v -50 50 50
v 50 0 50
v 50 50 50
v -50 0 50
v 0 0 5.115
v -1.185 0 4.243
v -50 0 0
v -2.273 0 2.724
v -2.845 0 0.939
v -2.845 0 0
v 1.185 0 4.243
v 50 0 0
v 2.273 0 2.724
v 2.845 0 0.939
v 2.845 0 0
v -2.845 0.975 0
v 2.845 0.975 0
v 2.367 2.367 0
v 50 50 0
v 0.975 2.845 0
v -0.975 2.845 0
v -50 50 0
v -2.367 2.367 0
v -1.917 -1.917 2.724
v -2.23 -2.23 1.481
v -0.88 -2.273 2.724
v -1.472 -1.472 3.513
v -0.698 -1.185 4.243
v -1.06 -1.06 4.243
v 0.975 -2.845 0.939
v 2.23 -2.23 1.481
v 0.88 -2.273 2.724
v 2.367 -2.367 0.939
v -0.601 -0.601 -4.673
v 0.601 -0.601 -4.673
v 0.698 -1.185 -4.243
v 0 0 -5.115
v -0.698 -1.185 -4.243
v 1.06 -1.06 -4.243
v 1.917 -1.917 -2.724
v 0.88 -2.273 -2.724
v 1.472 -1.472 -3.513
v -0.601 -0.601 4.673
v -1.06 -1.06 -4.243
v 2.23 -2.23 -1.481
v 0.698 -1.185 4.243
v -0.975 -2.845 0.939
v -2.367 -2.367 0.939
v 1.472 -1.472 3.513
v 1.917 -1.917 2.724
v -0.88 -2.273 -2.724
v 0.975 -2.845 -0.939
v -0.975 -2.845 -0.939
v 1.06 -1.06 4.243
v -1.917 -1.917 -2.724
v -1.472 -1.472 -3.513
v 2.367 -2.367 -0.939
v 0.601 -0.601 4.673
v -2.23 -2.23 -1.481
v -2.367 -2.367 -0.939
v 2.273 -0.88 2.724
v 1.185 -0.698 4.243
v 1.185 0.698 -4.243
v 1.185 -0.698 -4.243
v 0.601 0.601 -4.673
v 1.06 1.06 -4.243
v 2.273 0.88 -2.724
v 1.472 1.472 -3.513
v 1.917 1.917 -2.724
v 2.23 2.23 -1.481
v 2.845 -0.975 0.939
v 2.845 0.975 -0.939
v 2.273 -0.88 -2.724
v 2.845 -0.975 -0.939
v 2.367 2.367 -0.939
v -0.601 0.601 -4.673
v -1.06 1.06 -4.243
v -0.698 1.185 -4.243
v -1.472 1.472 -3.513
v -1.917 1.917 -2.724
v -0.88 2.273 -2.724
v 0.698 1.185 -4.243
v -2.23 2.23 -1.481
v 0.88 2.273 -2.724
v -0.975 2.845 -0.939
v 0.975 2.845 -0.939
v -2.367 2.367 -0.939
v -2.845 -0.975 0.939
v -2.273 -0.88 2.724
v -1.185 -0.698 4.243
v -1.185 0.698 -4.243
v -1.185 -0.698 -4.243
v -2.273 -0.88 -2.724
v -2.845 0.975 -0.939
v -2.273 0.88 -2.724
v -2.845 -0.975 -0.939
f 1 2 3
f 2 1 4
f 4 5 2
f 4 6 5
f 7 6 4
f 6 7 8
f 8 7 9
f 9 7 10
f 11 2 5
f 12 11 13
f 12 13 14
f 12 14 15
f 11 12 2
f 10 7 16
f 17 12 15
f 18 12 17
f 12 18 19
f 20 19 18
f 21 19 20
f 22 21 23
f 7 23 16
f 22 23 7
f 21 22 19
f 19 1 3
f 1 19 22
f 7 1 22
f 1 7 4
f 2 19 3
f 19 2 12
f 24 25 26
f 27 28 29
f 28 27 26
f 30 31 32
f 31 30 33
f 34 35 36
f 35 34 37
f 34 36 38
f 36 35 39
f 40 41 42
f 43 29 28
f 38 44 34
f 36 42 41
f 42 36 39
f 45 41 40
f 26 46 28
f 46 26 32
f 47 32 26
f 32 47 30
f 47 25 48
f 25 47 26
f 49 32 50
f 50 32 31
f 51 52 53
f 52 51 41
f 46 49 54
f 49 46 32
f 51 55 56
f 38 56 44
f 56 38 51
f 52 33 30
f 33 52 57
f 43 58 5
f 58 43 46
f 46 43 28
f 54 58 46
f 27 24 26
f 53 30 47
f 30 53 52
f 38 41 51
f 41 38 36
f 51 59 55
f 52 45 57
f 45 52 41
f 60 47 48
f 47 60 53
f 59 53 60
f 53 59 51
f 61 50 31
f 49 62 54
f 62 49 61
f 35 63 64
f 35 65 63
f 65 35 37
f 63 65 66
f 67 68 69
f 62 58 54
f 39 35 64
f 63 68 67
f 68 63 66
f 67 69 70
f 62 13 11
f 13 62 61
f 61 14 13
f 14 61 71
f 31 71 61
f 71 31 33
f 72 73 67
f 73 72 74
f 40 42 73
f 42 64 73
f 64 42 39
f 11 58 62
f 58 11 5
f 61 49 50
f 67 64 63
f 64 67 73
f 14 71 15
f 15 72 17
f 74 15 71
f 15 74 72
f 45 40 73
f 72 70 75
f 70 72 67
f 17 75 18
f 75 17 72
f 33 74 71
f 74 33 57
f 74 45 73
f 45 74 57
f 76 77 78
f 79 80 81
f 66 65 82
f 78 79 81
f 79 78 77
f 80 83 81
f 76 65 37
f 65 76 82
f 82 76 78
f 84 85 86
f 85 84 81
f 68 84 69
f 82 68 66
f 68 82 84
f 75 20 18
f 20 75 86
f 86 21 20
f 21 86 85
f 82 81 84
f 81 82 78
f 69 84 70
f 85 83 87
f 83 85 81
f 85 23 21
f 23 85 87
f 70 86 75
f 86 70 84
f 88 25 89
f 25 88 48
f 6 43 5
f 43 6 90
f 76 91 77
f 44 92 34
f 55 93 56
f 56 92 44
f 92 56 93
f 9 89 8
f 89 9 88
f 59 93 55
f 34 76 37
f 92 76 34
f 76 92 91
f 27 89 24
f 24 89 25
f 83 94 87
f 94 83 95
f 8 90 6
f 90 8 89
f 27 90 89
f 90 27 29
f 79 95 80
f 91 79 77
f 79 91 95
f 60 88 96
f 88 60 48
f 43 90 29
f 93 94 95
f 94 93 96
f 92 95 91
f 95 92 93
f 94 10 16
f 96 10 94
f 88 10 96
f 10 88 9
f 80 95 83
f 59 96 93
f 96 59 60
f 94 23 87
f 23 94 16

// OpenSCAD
//= Objekty s % jsou pouze v nahledu
//= Objekty s # pouzivaji normalne
//= Pri definic promenne na vice mistech plati jeji posledni definice


//= Vykresli kvadr 25x10x5 vycentrovanou na vsech osach
// cube([25,10,5], center=true);

//= Koule o polomeru vycentrovana na vsech osach
// sphere(5);

//= Vykresluje kuzel (spodni polomer, vrchni polomer, vyska)
// cylinder( r1=13, r2=0, h=20 );

//= Kostka o hrane 150, vycentrovana
// cube( 150, center=true);

//= Posunuje kouli po ose x o 200 jednotek
// translate( [-200, 0, 0] )
    // sphere( 100 );

//= Zrcadleni podle osy y
// mirror([0,1,0])
    //= Zmena rozmeru (na vsech osach na max 12 jednotek, na osach y a z proporcialne)
    // resize([12,12,12], auto=[0,1,1])
      //= Rotace vuci ose x
      // rotate([45,0,0])
        //= Rotace (45 stupnu, na ose z) - alternativni zapis
        // rotate( 45, [0,0,1])
          //= Skalovani vzhledem k osam, alternativne: scale( 0.5 )
          // scale( [1,1,2] )
            //= Koule o polomeru 100 jednotek
            // sphere( 100 );

//= Sjednoceni vice objektu v jeden
//= alternativne difference (prvni - druhy) nebo intersection (prunik)              
union() {
  // cube(150, center=true);
  // sphere( 100 );
}

//= Cyklus pro prvky {5, 4, 8}
for( i=[5, 4, 8]) {
  echo (i);
}

//= Cyklus od 5 do 8 (vcetne)
for( i=[5:8]) {
  echo (i);
}

//= Cyklus od 5 do 8 vcetne s krokem 0.5
for( i=[5:0.5:8]) {
  echo (i);
}

//= Definovani noveho modulu s 2 parametry
module sisojd( size = 12, amount = 4 ) {
  intersection_for(n = [1 : amount] ) {
    rotate([0,0,n*(360/amount)]) translate([size/4, 0,0])
      sphere(d=size);
  }
}

module mirror_and_keep(v=[1,0,0]) {
  //= Funkce zrcadli objekt na ktery je aplikovana
  mirror(v) child();
  
  //= Vykresli znovu objekt na ktery je aplikovana (bez transformaci vyse)
  child();
}

mirror_and_keep() cube(50);

sisojd();
